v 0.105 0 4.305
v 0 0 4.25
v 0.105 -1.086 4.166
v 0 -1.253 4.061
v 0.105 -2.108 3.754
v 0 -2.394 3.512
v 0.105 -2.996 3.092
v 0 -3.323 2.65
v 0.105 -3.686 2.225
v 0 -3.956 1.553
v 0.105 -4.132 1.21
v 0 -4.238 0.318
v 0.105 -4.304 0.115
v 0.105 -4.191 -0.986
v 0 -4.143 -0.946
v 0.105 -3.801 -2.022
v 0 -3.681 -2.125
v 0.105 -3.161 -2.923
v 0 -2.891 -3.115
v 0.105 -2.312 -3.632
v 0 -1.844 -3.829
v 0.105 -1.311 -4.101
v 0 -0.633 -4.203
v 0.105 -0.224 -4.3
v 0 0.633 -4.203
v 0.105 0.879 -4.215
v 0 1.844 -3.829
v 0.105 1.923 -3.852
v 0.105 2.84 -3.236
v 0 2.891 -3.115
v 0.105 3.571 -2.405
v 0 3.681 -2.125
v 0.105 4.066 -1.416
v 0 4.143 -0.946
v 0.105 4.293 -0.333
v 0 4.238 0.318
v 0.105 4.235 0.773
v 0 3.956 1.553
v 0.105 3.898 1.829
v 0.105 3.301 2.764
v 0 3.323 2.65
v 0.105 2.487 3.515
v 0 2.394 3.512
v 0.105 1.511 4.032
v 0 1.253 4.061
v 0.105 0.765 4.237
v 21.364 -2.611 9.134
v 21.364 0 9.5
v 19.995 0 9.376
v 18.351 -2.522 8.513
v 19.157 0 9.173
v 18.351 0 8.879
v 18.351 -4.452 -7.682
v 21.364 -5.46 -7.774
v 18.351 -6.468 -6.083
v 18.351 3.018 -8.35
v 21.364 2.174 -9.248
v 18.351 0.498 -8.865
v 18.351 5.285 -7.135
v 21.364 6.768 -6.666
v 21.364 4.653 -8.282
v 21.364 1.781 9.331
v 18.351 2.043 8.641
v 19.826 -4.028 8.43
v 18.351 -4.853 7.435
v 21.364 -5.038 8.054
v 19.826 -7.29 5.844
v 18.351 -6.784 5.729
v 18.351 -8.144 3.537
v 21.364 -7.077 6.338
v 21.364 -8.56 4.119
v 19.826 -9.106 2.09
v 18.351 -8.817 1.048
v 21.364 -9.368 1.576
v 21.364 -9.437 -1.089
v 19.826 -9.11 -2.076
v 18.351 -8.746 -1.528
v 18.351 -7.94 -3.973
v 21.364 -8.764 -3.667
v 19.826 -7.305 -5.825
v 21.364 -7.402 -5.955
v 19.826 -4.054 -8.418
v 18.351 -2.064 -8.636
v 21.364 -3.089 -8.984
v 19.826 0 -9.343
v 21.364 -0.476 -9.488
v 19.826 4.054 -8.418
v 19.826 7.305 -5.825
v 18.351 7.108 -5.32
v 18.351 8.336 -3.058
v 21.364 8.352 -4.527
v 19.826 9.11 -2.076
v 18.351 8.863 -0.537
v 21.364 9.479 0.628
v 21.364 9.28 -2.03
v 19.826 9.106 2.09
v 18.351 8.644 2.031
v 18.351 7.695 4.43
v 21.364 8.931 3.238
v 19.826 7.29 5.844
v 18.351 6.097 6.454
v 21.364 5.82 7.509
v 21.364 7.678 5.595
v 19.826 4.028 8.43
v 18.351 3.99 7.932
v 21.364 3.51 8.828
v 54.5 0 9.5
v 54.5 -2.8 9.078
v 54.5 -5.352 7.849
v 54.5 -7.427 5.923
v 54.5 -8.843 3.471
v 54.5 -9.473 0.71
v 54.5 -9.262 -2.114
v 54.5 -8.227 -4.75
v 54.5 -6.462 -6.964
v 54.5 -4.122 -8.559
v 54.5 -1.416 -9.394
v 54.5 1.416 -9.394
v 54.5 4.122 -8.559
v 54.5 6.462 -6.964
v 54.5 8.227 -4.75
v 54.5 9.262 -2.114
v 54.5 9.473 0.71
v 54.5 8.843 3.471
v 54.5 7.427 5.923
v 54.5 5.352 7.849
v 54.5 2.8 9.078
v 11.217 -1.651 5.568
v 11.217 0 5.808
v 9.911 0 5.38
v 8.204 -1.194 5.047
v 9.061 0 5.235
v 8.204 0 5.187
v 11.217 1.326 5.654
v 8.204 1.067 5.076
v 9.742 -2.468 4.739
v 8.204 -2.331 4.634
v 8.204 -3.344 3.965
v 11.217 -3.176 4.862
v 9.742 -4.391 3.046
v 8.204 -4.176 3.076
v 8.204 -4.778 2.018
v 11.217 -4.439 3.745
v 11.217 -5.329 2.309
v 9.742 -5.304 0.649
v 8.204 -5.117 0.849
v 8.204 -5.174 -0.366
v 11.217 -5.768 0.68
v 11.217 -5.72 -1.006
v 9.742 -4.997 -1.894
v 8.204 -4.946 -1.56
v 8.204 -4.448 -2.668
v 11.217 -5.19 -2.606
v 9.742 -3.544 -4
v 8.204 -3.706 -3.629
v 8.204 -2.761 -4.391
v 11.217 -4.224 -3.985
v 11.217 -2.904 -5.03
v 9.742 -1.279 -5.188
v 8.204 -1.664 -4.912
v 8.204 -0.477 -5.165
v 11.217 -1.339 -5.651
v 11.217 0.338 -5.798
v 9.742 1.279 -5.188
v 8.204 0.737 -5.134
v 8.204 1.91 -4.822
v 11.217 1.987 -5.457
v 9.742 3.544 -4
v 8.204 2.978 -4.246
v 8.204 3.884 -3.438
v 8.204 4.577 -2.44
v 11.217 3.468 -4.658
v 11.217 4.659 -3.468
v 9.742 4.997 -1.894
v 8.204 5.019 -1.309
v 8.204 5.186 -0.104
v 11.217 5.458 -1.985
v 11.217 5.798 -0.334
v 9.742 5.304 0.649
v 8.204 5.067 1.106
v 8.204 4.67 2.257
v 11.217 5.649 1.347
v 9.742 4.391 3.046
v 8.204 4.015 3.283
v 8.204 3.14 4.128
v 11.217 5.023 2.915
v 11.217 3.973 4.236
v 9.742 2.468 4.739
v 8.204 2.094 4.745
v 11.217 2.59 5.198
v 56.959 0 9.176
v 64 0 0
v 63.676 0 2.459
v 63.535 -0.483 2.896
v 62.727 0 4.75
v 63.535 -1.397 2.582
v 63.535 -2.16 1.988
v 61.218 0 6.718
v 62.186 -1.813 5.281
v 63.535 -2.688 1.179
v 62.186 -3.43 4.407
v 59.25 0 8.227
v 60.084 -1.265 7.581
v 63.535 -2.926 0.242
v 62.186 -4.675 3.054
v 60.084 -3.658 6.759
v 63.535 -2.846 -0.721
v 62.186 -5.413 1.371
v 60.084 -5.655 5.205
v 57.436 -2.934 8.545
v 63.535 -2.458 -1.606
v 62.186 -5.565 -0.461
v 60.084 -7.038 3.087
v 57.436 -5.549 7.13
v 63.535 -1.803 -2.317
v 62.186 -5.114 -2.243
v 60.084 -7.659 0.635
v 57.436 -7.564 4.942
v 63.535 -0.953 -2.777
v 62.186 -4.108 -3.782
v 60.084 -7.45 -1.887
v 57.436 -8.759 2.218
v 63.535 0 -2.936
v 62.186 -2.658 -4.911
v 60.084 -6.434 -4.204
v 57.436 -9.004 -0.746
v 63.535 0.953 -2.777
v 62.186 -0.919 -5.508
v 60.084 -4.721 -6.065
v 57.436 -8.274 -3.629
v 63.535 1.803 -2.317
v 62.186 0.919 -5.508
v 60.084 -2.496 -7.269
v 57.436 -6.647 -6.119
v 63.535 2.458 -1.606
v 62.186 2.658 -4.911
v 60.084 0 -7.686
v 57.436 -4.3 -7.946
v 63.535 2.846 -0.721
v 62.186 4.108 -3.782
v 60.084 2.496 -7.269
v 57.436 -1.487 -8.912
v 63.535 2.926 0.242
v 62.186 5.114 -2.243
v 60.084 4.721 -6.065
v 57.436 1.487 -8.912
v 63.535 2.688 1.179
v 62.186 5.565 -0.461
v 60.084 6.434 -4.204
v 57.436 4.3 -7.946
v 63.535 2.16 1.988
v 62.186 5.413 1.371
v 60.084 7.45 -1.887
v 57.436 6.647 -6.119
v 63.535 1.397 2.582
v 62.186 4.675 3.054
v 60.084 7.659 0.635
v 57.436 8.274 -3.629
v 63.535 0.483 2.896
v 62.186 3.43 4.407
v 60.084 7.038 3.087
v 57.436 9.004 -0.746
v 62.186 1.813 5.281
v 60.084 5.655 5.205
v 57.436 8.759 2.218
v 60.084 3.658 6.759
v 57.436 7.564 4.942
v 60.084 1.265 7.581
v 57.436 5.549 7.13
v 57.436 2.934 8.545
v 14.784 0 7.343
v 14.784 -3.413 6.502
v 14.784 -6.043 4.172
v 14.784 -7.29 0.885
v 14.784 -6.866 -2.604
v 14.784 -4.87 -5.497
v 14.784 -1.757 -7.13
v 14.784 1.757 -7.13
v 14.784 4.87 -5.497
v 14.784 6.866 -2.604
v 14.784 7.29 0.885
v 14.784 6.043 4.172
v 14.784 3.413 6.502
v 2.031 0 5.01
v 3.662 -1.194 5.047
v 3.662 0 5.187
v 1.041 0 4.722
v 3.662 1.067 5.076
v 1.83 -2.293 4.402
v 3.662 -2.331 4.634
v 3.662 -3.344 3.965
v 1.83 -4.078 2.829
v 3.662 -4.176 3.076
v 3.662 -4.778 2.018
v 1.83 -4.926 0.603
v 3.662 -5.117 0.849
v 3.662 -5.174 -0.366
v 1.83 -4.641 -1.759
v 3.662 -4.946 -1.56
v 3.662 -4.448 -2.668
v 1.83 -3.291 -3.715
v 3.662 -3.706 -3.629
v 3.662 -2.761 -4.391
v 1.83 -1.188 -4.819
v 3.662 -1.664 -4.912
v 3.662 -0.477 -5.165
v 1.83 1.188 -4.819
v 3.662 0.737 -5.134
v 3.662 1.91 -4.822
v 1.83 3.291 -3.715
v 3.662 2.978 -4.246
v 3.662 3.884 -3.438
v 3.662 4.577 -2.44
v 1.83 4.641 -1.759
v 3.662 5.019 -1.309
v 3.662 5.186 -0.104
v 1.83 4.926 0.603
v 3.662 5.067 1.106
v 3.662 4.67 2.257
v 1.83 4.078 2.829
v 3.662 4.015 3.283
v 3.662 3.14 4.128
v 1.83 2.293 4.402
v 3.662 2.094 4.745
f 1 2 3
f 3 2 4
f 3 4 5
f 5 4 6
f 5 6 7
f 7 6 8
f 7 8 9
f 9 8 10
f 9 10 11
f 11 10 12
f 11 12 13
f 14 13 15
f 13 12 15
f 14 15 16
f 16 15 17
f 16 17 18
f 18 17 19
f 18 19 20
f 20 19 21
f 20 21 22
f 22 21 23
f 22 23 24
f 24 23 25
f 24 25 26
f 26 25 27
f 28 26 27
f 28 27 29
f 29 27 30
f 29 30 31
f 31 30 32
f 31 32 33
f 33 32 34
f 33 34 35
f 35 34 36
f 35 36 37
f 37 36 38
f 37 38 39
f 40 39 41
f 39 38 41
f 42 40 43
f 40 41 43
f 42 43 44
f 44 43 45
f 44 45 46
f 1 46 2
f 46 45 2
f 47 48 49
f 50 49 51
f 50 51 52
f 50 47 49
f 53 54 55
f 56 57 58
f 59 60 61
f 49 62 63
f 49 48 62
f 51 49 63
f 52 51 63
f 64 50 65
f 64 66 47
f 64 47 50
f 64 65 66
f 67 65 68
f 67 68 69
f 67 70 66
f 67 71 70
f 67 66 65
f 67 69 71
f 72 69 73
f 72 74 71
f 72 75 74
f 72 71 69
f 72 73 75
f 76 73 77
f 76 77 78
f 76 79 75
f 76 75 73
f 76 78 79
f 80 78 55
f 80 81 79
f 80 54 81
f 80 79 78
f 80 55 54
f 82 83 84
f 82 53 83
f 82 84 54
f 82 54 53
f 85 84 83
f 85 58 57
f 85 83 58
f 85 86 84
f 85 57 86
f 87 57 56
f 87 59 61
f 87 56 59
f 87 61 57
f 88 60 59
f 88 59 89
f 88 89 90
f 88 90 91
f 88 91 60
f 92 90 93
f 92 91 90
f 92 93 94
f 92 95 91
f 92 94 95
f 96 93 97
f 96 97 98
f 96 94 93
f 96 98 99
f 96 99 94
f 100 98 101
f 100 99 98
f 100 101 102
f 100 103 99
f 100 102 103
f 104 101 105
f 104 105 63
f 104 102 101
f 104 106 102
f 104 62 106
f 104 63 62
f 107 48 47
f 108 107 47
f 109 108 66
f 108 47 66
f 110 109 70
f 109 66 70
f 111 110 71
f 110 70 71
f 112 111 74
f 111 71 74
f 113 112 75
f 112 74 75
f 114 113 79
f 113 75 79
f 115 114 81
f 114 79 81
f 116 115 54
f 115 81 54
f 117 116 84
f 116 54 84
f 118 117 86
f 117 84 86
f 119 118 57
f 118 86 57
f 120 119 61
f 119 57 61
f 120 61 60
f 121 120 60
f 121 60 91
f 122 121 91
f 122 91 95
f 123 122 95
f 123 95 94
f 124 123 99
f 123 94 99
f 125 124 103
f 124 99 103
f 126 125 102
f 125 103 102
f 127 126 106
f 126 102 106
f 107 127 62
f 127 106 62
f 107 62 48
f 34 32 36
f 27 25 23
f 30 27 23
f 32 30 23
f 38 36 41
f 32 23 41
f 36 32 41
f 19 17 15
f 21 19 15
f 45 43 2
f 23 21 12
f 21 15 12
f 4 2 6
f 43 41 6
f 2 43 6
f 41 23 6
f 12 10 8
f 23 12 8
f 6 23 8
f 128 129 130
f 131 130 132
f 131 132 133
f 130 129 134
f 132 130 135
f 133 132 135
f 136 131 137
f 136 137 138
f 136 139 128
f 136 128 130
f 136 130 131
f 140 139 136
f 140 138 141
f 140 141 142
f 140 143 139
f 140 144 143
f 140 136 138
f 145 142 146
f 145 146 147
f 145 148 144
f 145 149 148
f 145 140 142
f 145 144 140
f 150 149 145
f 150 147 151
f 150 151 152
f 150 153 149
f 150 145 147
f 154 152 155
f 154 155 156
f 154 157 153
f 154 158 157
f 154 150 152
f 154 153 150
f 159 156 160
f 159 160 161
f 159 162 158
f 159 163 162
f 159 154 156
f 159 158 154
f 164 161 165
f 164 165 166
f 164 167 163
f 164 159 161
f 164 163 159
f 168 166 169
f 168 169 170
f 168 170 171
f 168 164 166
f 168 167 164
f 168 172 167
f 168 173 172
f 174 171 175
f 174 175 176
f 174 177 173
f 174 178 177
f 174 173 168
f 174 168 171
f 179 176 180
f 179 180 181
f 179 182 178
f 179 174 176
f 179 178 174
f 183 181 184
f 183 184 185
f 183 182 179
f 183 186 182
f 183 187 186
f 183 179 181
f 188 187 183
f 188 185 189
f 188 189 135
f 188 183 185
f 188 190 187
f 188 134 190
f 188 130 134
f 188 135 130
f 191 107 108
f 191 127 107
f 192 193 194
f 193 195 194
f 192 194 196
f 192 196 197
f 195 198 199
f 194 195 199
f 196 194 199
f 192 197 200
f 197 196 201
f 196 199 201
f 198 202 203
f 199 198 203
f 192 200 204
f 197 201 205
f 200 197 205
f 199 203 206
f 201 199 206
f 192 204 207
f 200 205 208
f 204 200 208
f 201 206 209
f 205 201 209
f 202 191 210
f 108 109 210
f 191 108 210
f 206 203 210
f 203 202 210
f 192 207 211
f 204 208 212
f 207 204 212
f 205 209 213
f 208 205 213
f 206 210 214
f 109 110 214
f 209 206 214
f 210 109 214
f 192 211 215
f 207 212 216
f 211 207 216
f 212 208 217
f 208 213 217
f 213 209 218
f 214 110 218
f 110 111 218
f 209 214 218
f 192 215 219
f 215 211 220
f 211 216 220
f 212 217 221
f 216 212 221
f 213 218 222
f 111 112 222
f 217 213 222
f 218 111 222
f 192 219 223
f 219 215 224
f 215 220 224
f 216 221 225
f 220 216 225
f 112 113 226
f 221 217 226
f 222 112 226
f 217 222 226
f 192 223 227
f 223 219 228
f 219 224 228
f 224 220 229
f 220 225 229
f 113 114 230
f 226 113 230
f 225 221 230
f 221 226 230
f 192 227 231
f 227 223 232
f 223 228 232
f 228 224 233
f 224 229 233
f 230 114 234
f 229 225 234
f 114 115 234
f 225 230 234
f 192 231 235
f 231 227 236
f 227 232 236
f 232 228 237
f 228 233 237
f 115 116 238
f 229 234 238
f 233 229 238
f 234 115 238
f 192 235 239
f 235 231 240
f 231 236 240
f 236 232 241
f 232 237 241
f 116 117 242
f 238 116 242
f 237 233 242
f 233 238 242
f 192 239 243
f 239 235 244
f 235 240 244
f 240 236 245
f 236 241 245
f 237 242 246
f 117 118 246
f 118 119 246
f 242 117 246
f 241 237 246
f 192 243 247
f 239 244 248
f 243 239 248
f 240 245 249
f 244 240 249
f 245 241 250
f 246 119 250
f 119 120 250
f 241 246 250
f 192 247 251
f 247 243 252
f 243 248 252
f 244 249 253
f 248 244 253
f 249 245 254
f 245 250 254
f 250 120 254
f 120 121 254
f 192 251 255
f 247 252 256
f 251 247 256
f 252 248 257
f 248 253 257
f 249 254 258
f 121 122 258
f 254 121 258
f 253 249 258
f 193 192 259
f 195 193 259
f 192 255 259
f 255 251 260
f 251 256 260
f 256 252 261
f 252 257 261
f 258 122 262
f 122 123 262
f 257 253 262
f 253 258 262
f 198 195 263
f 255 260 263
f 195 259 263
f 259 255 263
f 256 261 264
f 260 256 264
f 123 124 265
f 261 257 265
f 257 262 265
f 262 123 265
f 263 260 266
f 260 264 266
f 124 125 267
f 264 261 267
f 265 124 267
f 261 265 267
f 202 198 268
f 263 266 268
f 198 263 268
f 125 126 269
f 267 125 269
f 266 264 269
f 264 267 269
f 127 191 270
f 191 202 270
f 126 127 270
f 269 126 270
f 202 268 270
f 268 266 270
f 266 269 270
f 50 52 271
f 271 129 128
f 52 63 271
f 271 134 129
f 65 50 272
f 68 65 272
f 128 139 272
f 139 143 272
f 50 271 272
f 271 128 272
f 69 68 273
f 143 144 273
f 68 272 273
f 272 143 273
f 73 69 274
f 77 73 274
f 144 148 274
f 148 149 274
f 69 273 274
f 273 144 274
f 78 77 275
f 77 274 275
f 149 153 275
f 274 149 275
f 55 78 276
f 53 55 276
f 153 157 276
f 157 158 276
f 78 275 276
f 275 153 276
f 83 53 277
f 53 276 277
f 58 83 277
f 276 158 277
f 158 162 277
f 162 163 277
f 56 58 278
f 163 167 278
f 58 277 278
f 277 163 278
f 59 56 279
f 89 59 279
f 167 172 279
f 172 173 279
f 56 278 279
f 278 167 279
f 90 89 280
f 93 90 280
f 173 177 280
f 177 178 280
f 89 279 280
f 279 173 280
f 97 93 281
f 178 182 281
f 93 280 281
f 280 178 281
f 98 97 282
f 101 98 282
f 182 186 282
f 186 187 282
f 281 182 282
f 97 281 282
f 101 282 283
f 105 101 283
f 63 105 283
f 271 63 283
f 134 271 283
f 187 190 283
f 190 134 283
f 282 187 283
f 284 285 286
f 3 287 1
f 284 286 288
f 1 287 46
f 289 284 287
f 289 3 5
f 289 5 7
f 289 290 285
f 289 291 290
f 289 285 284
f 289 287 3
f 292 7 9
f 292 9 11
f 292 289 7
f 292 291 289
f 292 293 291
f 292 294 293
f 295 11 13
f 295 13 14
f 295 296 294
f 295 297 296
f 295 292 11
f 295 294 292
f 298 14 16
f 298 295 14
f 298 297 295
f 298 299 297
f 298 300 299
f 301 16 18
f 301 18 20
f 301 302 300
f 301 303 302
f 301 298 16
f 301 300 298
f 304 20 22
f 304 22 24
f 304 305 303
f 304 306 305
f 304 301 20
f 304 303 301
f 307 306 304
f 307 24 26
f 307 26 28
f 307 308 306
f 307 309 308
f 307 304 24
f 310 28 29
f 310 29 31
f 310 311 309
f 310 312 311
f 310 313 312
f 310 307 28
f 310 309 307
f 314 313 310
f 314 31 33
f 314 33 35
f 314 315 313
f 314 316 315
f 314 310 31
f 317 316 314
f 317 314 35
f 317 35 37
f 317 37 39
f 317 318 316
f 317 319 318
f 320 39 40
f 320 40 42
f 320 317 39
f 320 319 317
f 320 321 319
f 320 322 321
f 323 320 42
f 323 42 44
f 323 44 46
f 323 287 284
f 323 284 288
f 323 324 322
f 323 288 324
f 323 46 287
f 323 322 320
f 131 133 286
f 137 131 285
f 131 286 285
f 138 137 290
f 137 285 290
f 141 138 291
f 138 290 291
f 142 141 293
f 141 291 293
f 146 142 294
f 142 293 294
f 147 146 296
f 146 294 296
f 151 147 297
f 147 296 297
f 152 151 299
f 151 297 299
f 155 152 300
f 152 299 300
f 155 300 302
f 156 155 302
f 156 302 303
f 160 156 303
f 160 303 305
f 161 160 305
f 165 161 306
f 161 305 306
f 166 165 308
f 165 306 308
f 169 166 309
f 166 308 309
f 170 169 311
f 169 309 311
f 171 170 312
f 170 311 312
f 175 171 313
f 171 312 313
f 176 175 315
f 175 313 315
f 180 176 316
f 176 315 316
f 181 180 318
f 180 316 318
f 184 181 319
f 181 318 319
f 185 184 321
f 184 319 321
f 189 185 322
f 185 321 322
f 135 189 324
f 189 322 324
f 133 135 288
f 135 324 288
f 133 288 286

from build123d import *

# Parameters (mm, degrees)
F2_R = 9.5
F3_R = 7.62


with BuildPart() as f1:
    # F0 (on Front) → F1 (revolve)
    with BuildSketch(Plane.XZ):
        Polygon((0, 4.25), (0, 0), (64, 0), (64, 9.5), (19.793399, 9.5), (9.774541, 5.186723), (1.774541, 5.186723), align=None)
    revolve(axis=Axis((32, 0, 0), (1, 0, 0)))

    # F2
    f2_edges = [f1.edges().sort_by_distance(p)[0] for p in [
        (64, 0, -9.5),
    ]]
    fillet(f2_edges, radius=F2_R)

    # F3
    f3_edges = [f1.edges().sort_by_distance(p)[0] for p in [
        (19.793399, 0, -9.5),
        (1.774541, 0, -5.186723),
        (9.774541, 0, -5.186723),
    ]]
    fillet(f3_edges, radius=F3_R)


solid = f1.part
